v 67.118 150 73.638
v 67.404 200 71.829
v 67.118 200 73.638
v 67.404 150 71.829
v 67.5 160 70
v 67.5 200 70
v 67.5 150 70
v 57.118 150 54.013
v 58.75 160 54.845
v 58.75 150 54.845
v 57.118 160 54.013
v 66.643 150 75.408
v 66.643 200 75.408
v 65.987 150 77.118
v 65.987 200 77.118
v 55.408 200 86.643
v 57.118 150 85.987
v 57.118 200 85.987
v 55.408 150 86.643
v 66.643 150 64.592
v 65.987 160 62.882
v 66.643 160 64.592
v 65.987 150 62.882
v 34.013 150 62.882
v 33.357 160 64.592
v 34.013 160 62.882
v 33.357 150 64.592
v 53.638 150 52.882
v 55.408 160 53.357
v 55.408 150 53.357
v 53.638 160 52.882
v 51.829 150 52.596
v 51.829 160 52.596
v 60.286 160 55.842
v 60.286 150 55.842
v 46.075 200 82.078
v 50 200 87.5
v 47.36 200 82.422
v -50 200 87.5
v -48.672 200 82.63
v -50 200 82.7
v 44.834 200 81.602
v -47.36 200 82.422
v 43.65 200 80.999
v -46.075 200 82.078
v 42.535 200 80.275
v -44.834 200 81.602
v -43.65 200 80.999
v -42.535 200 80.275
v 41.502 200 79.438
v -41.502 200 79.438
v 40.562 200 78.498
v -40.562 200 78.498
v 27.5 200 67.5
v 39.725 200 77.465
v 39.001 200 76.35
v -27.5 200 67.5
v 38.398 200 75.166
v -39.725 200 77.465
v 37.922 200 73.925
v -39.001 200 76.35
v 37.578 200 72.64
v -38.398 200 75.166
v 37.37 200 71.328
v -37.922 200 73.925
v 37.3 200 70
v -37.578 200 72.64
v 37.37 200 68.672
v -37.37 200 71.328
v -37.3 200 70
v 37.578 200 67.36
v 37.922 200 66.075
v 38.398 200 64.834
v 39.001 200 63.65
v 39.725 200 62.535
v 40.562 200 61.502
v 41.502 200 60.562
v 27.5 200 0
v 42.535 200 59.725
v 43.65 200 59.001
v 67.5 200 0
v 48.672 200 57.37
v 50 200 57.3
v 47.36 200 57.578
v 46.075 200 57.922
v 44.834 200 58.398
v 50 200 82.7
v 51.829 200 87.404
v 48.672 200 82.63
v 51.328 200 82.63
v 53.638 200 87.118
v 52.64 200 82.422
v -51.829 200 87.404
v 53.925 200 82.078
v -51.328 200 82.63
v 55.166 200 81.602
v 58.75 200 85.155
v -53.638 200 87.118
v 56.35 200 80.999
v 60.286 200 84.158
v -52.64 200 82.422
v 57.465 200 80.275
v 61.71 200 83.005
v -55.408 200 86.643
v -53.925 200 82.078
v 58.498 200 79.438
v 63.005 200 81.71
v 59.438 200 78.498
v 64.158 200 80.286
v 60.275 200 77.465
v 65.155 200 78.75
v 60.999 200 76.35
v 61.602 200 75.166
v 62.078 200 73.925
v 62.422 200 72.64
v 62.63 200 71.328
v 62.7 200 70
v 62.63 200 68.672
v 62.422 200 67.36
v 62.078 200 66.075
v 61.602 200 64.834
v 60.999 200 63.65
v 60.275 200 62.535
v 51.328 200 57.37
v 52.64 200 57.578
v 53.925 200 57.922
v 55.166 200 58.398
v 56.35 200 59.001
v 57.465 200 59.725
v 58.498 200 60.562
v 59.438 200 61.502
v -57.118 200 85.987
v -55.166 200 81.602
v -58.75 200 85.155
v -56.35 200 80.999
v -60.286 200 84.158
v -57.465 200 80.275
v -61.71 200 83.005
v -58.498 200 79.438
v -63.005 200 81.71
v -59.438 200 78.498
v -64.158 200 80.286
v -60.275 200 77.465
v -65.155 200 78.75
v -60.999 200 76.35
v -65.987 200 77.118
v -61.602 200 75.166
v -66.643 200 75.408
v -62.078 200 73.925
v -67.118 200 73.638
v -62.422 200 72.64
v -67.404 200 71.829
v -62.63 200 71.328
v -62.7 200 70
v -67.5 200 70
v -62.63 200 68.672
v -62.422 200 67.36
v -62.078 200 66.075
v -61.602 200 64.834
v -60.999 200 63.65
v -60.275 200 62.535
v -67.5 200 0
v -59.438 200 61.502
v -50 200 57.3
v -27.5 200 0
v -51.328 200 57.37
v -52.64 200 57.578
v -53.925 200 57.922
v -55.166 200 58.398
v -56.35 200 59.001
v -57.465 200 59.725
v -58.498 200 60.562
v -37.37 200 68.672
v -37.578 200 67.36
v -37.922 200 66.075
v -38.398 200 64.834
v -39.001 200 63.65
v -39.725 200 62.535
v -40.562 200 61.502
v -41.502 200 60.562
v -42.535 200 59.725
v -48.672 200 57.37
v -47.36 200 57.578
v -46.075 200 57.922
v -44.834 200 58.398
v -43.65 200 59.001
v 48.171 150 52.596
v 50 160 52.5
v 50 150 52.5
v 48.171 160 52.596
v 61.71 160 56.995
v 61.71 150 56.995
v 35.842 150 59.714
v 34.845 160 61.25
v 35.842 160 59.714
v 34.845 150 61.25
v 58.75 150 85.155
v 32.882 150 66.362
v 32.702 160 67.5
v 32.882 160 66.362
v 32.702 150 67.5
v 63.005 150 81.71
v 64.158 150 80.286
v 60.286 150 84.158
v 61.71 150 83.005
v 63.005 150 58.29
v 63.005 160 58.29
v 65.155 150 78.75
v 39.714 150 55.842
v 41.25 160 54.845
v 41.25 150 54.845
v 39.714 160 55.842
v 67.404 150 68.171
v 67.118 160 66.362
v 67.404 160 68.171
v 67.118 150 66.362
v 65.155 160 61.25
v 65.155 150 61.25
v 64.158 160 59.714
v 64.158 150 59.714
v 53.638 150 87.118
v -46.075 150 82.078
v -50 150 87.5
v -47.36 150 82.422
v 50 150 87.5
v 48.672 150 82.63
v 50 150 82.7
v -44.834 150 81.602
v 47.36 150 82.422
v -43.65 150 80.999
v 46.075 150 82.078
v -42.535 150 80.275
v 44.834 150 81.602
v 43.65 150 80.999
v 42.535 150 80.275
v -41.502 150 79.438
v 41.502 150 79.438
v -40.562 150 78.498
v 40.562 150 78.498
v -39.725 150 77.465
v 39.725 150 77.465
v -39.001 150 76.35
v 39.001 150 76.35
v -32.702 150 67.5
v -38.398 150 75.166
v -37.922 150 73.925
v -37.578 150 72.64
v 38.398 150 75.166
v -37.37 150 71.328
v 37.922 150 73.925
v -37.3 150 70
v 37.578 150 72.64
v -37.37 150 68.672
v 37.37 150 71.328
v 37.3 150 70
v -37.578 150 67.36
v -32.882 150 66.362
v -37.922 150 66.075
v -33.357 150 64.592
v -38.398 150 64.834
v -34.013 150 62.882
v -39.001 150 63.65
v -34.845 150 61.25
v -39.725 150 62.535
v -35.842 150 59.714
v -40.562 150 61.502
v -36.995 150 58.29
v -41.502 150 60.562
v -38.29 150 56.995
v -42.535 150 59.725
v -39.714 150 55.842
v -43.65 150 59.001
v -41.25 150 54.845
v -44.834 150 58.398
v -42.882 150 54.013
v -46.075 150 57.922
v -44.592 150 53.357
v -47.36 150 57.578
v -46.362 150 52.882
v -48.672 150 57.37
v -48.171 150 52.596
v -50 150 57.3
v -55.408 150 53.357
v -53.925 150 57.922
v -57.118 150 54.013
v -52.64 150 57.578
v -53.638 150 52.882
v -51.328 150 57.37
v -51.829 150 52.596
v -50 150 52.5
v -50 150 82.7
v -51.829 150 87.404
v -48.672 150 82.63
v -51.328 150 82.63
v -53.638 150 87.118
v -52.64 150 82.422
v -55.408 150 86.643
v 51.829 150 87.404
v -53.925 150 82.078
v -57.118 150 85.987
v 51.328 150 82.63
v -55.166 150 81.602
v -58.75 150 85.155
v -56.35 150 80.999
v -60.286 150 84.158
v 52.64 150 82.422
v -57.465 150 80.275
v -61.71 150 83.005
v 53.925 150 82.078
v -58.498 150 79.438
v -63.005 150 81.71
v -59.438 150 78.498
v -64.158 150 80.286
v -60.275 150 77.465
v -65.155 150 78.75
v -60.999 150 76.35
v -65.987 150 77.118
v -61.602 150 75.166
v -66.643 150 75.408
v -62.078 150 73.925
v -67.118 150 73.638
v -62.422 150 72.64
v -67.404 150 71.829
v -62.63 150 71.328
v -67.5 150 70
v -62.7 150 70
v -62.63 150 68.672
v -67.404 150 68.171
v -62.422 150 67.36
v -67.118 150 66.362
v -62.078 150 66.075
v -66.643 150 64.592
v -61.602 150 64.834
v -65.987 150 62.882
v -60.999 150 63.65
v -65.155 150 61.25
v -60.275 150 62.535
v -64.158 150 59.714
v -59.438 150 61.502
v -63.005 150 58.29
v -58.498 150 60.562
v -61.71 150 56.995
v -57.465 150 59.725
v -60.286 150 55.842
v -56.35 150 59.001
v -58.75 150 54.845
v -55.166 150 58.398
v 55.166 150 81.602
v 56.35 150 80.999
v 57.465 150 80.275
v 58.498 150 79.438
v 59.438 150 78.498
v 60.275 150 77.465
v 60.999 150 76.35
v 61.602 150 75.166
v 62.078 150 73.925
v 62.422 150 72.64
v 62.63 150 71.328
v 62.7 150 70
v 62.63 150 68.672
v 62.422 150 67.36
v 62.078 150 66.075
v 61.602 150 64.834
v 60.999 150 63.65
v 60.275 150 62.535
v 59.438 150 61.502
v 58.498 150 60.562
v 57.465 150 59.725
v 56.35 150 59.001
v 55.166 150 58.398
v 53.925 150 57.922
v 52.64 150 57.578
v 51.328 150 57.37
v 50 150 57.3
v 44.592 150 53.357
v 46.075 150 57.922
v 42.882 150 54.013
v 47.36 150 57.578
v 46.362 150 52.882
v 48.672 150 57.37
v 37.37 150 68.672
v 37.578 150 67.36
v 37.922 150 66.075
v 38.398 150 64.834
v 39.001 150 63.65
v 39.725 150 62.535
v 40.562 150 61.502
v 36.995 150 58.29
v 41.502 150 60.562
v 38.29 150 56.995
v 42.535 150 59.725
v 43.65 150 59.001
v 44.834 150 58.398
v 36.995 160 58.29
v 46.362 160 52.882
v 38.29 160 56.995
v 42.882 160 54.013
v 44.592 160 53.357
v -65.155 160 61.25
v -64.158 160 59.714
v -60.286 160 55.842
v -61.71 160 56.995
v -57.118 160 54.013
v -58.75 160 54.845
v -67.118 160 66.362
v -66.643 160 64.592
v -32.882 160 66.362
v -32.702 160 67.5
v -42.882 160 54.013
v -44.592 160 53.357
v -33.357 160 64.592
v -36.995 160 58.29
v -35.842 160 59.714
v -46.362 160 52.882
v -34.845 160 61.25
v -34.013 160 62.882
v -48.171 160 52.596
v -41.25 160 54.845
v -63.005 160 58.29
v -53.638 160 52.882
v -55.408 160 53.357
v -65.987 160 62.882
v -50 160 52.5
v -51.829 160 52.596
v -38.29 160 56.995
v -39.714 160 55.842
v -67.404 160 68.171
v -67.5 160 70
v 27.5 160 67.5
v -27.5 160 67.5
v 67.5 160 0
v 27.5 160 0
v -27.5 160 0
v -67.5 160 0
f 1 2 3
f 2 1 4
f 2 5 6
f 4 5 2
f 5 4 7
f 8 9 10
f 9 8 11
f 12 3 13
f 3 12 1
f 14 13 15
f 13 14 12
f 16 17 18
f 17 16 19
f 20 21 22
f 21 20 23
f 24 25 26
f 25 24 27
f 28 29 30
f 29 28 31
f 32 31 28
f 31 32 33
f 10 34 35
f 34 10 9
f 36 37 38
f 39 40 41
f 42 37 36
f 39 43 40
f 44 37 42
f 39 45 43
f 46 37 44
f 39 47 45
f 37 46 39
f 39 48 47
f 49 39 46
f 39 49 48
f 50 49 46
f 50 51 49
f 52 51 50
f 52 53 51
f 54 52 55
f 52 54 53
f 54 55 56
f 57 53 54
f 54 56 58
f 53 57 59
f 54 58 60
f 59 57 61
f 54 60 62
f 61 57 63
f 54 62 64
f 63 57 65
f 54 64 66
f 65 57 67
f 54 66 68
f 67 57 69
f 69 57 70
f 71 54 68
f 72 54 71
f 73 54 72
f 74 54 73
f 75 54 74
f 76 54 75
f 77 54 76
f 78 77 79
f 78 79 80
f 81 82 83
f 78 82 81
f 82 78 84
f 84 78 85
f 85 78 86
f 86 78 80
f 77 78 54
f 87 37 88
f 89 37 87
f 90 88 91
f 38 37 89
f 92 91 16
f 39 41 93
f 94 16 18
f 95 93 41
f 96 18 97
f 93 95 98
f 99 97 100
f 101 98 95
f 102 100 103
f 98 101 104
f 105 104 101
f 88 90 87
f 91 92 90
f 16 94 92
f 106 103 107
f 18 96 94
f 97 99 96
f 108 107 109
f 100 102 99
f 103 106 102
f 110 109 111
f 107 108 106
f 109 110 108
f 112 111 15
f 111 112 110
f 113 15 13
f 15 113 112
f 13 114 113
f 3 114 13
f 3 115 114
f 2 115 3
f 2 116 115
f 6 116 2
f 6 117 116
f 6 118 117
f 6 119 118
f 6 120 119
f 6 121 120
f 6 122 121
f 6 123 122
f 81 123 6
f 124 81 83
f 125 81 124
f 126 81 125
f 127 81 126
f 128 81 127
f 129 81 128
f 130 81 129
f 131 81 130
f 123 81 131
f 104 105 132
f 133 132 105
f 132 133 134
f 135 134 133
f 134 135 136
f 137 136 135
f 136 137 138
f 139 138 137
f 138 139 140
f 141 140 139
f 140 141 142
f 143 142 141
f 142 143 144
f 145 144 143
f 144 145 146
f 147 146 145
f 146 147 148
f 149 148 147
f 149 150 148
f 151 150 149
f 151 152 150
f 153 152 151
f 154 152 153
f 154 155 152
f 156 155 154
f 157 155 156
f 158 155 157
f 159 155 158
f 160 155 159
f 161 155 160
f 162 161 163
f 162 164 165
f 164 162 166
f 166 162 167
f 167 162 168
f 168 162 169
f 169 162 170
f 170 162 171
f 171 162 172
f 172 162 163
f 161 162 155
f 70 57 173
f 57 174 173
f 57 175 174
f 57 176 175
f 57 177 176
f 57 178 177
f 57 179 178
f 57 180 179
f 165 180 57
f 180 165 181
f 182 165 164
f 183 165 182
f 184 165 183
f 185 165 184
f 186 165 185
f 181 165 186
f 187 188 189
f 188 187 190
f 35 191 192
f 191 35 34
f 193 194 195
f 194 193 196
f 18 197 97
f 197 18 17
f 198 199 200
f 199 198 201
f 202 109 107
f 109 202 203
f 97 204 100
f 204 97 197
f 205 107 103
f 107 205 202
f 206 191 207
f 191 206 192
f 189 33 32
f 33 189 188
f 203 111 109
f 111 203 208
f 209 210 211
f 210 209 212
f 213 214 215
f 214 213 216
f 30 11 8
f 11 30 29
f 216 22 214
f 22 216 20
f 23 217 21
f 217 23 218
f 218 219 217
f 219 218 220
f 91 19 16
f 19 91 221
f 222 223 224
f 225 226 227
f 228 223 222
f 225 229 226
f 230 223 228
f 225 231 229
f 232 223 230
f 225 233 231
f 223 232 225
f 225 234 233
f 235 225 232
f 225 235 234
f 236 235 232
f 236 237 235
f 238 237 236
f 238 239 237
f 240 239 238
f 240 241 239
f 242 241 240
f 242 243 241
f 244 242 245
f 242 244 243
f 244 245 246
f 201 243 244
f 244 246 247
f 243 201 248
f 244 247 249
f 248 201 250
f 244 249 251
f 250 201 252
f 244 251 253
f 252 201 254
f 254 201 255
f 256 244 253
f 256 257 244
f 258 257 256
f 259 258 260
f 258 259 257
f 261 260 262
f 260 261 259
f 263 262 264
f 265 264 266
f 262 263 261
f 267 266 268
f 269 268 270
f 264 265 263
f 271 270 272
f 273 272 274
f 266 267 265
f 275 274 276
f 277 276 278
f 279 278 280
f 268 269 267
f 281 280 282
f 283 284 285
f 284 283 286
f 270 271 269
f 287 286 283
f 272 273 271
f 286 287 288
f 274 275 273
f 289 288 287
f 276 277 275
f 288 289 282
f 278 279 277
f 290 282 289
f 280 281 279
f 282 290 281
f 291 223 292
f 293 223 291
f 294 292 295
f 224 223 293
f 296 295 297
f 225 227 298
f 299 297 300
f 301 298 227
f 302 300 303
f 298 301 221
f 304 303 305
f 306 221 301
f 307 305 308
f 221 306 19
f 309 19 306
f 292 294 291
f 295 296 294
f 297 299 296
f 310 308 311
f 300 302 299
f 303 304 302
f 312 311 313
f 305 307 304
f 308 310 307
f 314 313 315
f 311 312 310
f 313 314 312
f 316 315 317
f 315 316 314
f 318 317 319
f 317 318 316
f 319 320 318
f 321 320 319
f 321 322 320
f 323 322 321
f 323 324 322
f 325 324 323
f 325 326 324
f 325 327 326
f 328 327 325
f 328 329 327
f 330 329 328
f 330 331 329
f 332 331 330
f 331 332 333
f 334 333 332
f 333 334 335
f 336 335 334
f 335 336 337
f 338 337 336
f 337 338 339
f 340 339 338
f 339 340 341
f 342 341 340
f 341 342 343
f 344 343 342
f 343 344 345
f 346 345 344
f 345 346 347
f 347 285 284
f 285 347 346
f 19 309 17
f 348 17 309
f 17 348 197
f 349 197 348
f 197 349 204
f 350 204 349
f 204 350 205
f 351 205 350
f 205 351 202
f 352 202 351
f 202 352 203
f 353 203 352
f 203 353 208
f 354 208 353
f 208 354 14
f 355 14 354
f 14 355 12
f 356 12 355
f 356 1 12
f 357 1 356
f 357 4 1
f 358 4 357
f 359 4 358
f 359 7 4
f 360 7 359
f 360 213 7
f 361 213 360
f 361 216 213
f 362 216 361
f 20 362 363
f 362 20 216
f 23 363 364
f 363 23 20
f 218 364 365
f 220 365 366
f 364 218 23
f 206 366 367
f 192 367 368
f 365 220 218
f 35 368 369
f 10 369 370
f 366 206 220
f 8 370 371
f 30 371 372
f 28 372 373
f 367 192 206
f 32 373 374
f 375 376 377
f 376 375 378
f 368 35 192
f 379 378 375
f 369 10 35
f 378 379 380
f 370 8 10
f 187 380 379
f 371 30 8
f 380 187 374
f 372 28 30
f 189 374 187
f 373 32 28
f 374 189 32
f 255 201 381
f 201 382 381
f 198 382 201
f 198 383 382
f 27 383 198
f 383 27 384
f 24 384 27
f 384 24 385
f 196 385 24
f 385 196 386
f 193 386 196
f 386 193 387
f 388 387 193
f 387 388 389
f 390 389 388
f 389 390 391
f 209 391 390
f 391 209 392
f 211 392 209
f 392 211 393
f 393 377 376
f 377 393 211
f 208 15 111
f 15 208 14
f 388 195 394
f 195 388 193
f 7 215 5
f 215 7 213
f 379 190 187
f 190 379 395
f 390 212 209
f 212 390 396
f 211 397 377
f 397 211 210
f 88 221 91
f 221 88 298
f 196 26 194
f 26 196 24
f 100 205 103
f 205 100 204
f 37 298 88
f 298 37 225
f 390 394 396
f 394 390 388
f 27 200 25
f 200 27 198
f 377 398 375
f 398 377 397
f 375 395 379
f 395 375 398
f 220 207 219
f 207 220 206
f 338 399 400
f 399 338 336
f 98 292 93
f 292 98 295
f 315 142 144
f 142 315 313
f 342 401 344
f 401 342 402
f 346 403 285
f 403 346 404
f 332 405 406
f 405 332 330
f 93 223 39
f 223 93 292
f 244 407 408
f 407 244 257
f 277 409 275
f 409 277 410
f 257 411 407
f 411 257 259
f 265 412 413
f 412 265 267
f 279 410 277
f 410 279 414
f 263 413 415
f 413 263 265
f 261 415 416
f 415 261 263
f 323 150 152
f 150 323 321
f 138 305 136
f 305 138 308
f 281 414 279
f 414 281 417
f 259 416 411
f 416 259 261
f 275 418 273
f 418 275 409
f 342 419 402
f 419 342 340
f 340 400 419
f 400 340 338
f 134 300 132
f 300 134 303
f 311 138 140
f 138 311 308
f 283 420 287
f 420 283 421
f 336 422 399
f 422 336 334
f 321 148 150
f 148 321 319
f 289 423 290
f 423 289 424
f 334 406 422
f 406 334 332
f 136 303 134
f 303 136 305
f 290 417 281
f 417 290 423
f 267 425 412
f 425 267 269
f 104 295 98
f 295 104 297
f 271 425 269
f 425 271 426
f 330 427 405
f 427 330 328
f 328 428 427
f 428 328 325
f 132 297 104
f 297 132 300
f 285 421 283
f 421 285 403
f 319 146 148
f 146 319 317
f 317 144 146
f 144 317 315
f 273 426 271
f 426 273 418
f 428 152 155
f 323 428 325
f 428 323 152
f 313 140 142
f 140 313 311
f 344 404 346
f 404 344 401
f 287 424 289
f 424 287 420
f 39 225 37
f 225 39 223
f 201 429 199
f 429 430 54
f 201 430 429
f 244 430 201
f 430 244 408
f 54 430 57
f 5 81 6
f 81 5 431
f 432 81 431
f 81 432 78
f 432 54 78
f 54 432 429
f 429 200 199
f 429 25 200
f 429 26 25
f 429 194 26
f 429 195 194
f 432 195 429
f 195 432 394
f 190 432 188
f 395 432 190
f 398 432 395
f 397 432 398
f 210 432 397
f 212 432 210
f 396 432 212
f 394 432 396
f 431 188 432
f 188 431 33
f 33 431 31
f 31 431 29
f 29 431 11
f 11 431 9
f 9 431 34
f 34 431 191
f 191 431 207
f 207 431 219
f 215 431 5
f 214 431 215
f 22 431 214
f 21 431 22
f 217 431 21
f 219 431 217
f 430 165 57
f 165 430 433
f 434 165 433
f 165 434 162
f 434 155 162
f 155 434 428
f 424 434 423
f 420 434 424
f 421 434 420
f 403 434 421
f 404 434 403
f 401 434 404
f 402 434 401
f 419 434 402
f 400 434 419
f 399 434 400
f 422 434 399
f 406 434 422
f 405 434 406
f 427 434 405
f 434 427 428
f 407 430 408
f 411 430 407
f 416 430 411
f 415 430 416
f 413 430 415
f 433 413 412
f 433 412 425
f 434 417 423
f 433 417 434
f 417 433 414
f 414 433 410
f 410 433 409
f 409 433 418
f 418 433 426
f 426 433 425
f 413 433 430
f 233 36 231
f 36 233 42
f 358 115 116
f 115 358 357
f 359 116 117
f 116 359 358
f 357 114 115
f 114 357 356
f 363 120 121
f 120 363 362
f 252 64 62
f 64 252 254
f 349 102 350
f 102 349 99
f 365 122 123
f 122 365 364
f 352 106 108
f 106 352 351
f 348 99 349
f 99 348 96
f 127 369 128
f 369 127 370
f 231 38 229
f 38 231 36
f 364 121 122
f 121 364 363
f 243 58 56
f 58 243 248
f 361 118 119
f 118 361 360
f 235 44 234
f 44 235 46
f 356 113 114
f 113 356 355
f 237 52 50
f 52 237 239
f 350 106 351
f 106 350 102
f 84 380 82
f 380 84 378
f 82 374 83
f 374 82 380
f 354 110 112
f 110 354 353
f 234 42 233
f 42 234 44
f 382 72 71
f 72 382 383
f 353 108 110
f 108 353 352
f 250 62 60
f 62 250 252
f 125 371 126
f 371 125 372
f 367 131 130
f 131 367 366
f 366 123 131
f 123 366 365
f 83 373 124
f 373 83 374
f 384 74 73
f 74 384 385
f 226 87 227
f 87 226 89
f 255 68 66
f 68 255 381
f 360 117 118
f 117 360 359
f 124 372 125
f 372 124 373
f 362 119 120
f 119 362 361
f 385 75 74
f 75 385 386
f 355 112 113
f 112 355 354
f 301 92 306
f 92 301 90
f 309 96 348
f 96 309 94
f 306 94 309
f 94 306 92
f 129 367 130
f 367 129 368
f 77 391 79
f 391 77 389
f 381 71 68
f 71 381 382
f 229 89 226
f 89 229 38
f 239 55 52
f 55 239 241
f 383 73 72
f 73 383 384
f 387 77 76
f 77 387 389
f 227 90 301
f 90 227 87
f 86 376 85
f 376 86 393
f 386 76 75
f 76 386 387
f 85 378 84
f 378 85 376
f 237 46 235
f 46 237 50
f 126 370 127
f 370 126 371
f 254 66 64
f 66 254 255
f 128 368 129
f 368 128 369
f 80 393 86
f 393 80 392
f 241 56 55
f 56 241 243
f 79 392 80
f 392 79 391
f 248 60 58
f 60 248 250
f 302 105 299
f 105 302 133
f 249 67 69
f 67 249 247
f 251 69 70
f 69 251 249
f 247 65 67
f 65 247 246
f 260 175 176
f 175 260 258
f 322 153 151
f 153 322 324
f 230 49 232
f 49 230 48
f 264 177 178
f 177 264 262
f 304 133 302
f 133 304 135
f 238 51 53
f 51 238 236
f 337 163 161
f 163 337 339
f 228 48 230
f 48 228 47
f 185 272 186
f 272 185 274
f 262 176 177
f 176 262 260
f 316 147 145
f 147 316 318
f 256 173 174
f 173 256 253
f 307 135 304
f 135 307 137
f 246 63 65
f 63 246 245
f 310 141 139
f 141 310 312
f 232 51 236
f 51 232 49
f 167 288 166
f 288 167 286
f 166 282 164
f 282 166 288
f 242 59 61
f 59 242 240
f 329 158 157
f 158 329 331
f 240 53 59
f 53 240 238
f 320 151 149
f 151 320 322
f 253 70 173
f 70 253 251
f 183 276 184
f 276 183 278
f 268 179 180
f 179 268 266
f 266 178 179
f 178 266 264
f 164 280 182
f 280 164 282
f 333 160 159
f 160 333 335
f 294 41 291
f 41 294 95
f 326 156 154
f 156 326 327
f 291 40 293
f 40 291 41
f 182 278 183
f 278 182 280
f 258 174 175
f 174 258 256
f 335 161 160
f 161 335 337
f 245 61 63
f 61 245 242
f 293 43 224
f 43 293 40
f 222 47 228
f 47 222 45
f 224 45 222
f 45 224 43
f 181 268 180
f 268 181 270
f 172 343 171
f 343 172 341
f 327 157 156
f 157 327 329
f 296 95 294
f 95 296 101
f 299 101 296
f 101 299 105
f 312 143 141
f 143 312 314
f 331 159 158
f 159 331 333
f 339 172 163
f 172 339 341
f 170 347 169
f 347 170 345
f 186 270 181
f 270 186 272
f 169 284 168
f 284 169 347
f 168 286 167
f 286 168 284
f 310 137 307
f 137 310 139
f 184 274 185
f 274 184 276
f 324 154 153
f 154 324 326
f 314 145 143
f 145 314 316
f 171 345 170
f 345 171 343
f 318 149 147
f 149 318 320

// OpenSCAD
// file: common.scad
echo("common.scad - rounded_cube()");
module rounded_cube (cube_arr = [1, 1, 1], d = 0, center = false) {
	off_x = 0;
	off_y = 0;
	r = d/2;
	union () {
		cube([cube_arr[0] - d, cube_arr[1], cube_arr[2]], center = center);
		cube([cube_arr[0], cube_arr[1] - d, cube_arr[2]], center = center);
		translate ([1 * (cube_arr[0] / 2) - r , 1 * (cube_arr[1] / 2)- r, 0]) cylinder(r = r, h = cube_arr[2], center = center);
		translate ([-1 * (cube_arr[0] / 2) + r, -1 * (cube_arr[1] / 2) + r, 0]) cylinder(r = r, h = cube_arr[2], center = center);
		translate ([1 * (cube_arr[0] / 2) - r, -1 * (cube_arr[1] / 2) + r, 0]) cylinder(r = r, h = cube_arr[2], center = center);
		translate ([-1 * (cube_arr[0] / 2) + r, 1 * (cube_arr[1] / 2)- r, 0]) cylinder(r = r, h = cube_arr[2], center = center);
	}
}

echo("common.scad - trap_cube()");
module trap_cube(height = 19, top_x = 30, top_y = 34, bottom_x = 45, bottom_y = 65, wall_thickness = 2) {
	difference(){
		hull(){
			translate([0,0,height])
				cube([top_x, top_y, 0.1], center=true);
				cube([bottom_x, bottom_y, 0.1], center=true);
			}

		hull(){
			translate([0,0,height])
				cube([top_x - wall_thickness, top_y - wall_thickness, 0.1], center=true);
				cube([bottom_x - wall_thickness, bottom_y - wall_thickness, 0.1], center=true);
		}
	}
}

echo("common.scad - R()");
function R (diameter) = diameter / 2.0;

echo("common.scad - m3_nut");
module m3_nut (H = 5) {
    cylinder(r=R(6.6), h=H, center=true, $fn=6);
}

echo("common.scad - m4_nut");
module m4_nut (H = 5, DIAG = 8.1) {
    //tolerance
    hex(diag = DIAG, h = H);
}

module opto_endstop(){
 difference(){
  union(){
  // base PCB
   color("green") cube([33.0,1.6,10.5]);
  // add the switch module
   translate([8.4,1.6,10.5/2-6.4/2]) optoswitch();
   // connector
   translate([0.2,-7,0]) color("white") cube([5.8,7,10.5]);
   // led
   translate([3.5,1.6,10.5/2-1.5/2]) color("red") cube([2,0.7,1.5]);
  }
   translate([8.4,0,10.5/2-6.4/2]) {
   for ( hole = [2.75,24.5-2.75] ){
    rotate([90,0,0]) translate([hole,6.4/2,-4]) cylinder(r=1.5, h=4.5,$fn=40);
   }
  }
 }
}

// switch module
module optoswitch() {
    difference(){
        union (){
            color("gray") cube([24.5,3.5,6.4]);
            color("gray")translate([6.63,0,0]) cube([4.45,11.3,6.3]);
            color("gray")translate([13.63,0,0]) cube([4.45,11.3,6.3]);
        }
       for ( hole = [2.75,24.5-2.75] ){
           rotate([90,0,0]) translate([hole,6.4/2,-4]) cylinder(r=1.5, h=4.5,$fn=40);
       }	
     }
 }
 
 module hex (diag = 10, h = 1) {
    cylinder(r = diag / 2, h = h, center = true, $fn = 6);
}

module NEMA17_motor_shaft (L = 22.75) {
    //shaft
    difference () {
        cylinder(r = R(5), h = L, center = true, $fn = 30);
        translate([0, 4.5, 4.7]) cube([5, 5, L+1], center = true);
    }
}

//NEMA17 Stepper
module NEMA17 ( H = 33 ) { //alt = 47.5
    difference () {
        cube([42, 42, H], center = true);
        for (i = [0 : 3]) {
            rotate([0, 0, (i * 90) + 45]) translate([29.7, 0, 0]) cube([5.5, 5.5, H + 1], center = true);
        }
        translate([31/2, 31/2, (H/2)-1.9]) cylinder(r = R(3), h = 4, center = true, $fn=30);
        translate([-31/2, 31/2, (H/2)-1.9]) cylinder(r = R(3), h = 4, center = true, $fn=30);
        translate([31/2, -31/2, (H/2)-1.9]) cylinder(r = R(3), h = 4, center = true, $fn=30);
        translate([-31/2, -31/2, (H/2)-1.9]) cylinder(r = R(3), h = 4, center = true, $fn=30);
    }
    //pad
    translate([0, 0, (H/2) + (1.9/2)]) {
        cylinder(r = R(22), h = 1.9, center = true, $fn = 100);
    }
    translate([0, 0, (H/2) + (L/2)]) NEMA17_motor_shaft();
}

//Geartisan Worm Gear Motor - JSX40-370
module geared_motor () {
    cube([46, 32, 21], center = true);
    translate([(46 / 2) + (30 / 2), 0, 1.5]) rotate([0, 90, 0]) cylinder(r = 24 / 2, h = 30, center = true, $fn = 80);
    translate([-(46 / 2) + 14.5, 0, -18.5]) rotate([0, 0, 90]) motor_shaft();
    //pad
    translate([-(46 / 2) + 14.5, 0, -(1 / 2) - 10.5]) cylinder(r = 13 / 2, h = 1, center = true, $fn = 60);
    //mount pads
    translate([-0.5, 0, -(1.5 / 2) - 10.5]) motor_mounts();
}

module microswitch (position = [0, 0, 0], rotation = [0, 0, 0]) {
    translate(position) {
        rotate(rotation) {
            cube([16, 28, 9.5], center = true);
            translate([10, 8, 0]) rotate([0, 0, -7]) cube([1, 28, 4], center = true);
            translate([8 + 7, 14 + 8, 0]) cylinder(r = 2.5, h = 4, center = true);
            translate([0, -19, 0]) cube([6, 11, 9.5], center = true);
        }
    }
}
// main file
include <./common.scad>;

RAIL_SPACING = 100;
RAIL_H = 70;
RAIL_LEN = 400;
RAIL_D=25.4;

module rail (H = 100) {
    cylinder(r = R(RAIL_D), h = H, center = true, $fn = 60);
}

module rails () {
    translate([RAIL_SPACING/2, 0, RAIL_H]) rotate([90, 0, 0]) rail(RAIL_LEN);
    translate([-RAIL_SPACING/2, 0, RAIL_H]) rotate([90, 0, 0]) rail(RAIL_LEN);
}

module end () {
    L = 50;
    T = 20;
    translate ([0, -L / 2, 0]) {
        difference () {
            union () {
                translate([RAIL_SPACING/2, 0, RAIL_H]) rotate([90, 0, 0]) {
                    cylinder(r = R(35), h = L, center = true, $fn = 60);
                }
                translate([-RAIL_SPACING/2, 0, RAIL_H]) rotate([90, 0, 0]) {
                    cylinder(r = R(35), h = L, center = true, $fn = 60);
                }
                translate([0, 0, RAIL_H + (35 / 2) - (T / 2)]) cube([RAIL_SPACING, L, T], center = true);
                translate([RAIL_SPACING/2 - (5 / 2), 5, RAIL_H / 2]) cube([40, 40, RAIL_H], center = true);
                translate([-RAIL_SPACING/2 + (5 / 2), 5, RAIL_H / 2]) cube([40, 40, RAIL_H], center = true);
            }
            translate([RAIL_SPACING/2, 0, RAIL_H]) rotate([90, 0, 0]) {
                rail(L + 1);
            }
            translate([-RAIL_SPACING/2, 0, RAIL_H]) rotate([90, 0, 0]) {
                rail(L + 1);
            }
        }
    }
}


//color("blue") rails(); 
translate([0, RAIL_LEN / 2, 0]) end();
